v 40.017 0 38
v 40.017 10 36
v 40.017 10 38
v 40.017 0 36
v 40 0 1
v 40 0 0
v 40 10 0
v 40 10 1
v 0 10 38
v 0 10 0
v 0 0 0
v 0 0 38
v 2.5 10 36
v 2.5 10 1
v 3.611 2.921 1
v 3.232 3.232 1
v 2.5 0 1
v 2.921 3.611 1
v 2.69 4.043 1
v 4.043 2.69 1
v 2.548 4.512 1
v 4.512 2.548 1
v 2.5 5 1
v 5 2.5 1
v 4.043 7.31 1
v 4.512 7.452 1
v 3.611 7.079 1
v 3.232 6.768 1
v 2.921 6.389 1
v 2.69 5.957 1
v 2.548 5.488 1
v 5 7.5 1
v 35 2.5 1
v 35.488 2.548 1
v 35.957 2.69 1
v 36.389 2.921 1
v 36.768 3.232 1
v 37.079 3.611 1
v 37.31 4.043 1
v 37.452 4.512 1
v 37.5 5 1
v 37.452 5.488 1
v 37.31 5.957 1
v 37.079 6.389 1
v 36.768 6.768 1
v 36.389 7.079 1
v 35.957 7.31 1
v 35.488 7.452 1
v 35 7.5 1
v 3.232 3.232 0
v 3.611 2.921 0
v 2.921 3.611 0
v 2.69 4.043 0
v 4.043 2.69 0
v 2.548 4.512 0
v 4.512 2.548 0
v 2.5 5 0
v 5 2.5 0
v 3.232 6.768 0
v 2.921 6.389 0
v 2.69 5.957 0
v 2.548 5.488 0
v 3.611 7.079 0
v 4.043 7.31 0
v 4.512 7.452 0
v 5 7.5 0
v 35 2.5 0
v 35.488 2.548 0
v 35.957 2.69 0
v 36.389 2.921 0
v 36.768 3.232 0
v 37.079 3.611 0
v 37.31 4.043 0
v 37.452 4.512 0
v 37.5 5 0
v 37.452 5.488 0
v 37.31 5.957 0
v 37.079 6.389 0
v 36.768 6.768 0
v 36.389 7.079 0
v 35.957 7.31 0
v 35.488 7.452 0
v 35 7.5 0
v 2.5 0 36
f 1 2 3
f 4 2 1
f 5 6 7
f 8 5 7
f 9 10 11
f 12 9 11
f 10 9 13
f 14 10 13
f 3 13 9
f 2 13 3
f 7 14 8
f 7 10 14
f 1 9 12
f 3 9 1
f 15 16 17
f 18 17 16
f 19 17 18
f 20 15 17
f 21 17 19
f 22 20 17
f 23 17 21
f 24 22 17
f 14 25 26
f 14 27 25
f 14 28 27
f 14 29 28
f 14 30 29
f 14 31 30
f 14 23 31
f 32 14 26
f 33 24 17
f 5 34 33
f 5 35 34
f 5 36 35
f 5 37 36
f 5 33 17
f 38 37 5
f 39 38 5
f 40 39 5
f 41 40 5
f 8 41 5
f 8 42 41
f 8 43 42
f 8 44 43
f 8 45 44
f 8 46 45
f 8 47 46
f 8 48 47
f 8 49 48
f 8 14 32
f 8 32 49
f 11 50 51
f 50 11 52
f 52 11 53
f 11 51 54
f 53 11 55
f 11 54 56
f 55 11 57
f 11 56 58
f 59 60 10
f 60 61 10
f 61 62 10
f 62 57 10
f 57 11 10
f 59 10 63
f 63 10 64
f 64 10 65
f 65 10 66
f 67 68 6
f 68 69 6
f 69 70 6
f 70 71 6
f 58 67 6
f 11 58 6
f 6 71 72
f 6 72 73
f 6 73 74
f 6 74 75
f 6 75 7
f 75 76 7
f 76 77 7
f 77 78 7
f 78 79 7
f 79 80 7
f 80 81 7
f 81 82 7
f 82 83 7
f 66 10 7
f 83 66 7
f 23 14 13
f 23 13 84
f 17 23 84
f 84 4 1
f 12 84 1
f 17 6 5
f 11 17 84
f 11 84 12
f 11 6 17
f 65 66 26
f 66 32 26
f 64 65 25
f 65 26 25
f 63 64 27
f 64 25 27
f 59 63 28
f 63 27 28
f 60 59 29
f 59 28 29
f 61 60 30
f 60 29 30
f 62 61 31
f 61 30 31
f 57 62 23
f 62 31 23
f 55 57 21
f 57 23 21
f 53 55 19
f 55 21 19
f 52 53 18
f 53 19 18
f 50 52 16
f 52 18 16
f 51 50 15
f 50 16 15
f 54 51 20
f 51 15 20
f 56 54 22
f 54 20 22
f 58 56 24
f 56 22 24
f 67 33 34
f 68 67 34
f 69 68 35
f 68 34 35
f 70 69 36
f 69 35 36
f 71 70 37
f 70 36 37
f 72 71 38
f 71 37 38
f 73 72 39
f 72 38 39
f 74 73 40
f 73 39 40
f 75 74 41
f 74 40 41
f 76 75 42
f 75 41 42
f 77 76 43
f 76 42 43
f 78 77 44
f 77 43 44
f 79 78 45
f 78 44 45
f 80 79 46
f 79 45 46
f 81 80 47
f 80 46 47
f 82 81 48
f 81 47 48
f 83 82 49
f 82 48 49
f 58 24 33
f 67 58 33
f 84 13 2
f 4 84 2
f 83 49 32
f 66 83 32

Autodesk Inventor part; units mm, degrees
ref_plane "YZ Plane" through (0, 0, 0) normal (1, 0, 0) x (0, 1, 0)
ref_plane "XZ Plane" through (0, 0, 0) normal (0, 1, 0) x (-1, 0, 0)
ref_plane "XY Plane" through (0, 0, 0) normal (0, 0, 1) x (1, 0, 0)
sketch "Esboço1" plane through (0, 0, 0) normal (0, 0, 1) x (1, 0, 0)
  line L0 (0, 0) -> (40, 0)
  line L1 (40, 0) -> (40, 10)
  line L2 (40, 10) -> (0, 10)
  line L3 (0, 10) -> (0, 0)
  dimension "d0" = 40
  dimension "d1" = 10
extrude "Extrusão1" add sketch "Esboço1" along normal blind 1
sketch "Esboço2" plane through (0, 0, 1) normal (0, 0, 1) x (1, 0, 0)
  line L0 (5, 5) -> (35, 5) construction
  line L1 (5, 2.5) -> (35, 2.5)
  line L2 (35, 7.5) -> (5, 7.5)
  arc A0 (5, 7.5) -> (5, 2.5) centre (5, 5) ccw
  arc A1 (35, 2.5) -> (35, 7.5) centre (35, 5) ccw
  point P0 (0, 0)
  point P1 (20, 5)
  dimension "d4" = 30
  dimension "d5" = 5
extrude "Extrusão2" cut sketch "Esboço2" against normal blind 1
sketch "Esboço3" plane through (0, 0, 1) normal (0, 0, 1) x (1, 0, 0)
  line L0 (40, 10) -> (0, 10) projected
  line L1 (0, 0) -> (40, 0) projected
  line L2 (0, 10) -> (2.5, 10)
  line L3 (2.5, 10) -> (2.5, 0)
  line L4 (2.5, 0) -> (0, 0)
  line L5 (0, 0) -> (0, 10)
  dimension "d8" = 2.5
extrude "Extrusão3" add sketch "Esboço3" along normal blind 35
sketch "Esboço4" plane through (0, 0, 36) normal (0, 0, 1) x (1, 0, 0)
  line L0 (0, 10) -> (0, 0) projected
  line L1 (0, 10) -> (40.017, 10)
  line L2 (40.017, 10) -> (40.017, 0)
  line L3 (40.017, 0) -> (0, 0)
  line L4 (0, 0) -> (0, 10)
extrude "Extrusão4" add sketch "Esboço4" along normal blind 2
properties part number "Suporte prensas coletor"
